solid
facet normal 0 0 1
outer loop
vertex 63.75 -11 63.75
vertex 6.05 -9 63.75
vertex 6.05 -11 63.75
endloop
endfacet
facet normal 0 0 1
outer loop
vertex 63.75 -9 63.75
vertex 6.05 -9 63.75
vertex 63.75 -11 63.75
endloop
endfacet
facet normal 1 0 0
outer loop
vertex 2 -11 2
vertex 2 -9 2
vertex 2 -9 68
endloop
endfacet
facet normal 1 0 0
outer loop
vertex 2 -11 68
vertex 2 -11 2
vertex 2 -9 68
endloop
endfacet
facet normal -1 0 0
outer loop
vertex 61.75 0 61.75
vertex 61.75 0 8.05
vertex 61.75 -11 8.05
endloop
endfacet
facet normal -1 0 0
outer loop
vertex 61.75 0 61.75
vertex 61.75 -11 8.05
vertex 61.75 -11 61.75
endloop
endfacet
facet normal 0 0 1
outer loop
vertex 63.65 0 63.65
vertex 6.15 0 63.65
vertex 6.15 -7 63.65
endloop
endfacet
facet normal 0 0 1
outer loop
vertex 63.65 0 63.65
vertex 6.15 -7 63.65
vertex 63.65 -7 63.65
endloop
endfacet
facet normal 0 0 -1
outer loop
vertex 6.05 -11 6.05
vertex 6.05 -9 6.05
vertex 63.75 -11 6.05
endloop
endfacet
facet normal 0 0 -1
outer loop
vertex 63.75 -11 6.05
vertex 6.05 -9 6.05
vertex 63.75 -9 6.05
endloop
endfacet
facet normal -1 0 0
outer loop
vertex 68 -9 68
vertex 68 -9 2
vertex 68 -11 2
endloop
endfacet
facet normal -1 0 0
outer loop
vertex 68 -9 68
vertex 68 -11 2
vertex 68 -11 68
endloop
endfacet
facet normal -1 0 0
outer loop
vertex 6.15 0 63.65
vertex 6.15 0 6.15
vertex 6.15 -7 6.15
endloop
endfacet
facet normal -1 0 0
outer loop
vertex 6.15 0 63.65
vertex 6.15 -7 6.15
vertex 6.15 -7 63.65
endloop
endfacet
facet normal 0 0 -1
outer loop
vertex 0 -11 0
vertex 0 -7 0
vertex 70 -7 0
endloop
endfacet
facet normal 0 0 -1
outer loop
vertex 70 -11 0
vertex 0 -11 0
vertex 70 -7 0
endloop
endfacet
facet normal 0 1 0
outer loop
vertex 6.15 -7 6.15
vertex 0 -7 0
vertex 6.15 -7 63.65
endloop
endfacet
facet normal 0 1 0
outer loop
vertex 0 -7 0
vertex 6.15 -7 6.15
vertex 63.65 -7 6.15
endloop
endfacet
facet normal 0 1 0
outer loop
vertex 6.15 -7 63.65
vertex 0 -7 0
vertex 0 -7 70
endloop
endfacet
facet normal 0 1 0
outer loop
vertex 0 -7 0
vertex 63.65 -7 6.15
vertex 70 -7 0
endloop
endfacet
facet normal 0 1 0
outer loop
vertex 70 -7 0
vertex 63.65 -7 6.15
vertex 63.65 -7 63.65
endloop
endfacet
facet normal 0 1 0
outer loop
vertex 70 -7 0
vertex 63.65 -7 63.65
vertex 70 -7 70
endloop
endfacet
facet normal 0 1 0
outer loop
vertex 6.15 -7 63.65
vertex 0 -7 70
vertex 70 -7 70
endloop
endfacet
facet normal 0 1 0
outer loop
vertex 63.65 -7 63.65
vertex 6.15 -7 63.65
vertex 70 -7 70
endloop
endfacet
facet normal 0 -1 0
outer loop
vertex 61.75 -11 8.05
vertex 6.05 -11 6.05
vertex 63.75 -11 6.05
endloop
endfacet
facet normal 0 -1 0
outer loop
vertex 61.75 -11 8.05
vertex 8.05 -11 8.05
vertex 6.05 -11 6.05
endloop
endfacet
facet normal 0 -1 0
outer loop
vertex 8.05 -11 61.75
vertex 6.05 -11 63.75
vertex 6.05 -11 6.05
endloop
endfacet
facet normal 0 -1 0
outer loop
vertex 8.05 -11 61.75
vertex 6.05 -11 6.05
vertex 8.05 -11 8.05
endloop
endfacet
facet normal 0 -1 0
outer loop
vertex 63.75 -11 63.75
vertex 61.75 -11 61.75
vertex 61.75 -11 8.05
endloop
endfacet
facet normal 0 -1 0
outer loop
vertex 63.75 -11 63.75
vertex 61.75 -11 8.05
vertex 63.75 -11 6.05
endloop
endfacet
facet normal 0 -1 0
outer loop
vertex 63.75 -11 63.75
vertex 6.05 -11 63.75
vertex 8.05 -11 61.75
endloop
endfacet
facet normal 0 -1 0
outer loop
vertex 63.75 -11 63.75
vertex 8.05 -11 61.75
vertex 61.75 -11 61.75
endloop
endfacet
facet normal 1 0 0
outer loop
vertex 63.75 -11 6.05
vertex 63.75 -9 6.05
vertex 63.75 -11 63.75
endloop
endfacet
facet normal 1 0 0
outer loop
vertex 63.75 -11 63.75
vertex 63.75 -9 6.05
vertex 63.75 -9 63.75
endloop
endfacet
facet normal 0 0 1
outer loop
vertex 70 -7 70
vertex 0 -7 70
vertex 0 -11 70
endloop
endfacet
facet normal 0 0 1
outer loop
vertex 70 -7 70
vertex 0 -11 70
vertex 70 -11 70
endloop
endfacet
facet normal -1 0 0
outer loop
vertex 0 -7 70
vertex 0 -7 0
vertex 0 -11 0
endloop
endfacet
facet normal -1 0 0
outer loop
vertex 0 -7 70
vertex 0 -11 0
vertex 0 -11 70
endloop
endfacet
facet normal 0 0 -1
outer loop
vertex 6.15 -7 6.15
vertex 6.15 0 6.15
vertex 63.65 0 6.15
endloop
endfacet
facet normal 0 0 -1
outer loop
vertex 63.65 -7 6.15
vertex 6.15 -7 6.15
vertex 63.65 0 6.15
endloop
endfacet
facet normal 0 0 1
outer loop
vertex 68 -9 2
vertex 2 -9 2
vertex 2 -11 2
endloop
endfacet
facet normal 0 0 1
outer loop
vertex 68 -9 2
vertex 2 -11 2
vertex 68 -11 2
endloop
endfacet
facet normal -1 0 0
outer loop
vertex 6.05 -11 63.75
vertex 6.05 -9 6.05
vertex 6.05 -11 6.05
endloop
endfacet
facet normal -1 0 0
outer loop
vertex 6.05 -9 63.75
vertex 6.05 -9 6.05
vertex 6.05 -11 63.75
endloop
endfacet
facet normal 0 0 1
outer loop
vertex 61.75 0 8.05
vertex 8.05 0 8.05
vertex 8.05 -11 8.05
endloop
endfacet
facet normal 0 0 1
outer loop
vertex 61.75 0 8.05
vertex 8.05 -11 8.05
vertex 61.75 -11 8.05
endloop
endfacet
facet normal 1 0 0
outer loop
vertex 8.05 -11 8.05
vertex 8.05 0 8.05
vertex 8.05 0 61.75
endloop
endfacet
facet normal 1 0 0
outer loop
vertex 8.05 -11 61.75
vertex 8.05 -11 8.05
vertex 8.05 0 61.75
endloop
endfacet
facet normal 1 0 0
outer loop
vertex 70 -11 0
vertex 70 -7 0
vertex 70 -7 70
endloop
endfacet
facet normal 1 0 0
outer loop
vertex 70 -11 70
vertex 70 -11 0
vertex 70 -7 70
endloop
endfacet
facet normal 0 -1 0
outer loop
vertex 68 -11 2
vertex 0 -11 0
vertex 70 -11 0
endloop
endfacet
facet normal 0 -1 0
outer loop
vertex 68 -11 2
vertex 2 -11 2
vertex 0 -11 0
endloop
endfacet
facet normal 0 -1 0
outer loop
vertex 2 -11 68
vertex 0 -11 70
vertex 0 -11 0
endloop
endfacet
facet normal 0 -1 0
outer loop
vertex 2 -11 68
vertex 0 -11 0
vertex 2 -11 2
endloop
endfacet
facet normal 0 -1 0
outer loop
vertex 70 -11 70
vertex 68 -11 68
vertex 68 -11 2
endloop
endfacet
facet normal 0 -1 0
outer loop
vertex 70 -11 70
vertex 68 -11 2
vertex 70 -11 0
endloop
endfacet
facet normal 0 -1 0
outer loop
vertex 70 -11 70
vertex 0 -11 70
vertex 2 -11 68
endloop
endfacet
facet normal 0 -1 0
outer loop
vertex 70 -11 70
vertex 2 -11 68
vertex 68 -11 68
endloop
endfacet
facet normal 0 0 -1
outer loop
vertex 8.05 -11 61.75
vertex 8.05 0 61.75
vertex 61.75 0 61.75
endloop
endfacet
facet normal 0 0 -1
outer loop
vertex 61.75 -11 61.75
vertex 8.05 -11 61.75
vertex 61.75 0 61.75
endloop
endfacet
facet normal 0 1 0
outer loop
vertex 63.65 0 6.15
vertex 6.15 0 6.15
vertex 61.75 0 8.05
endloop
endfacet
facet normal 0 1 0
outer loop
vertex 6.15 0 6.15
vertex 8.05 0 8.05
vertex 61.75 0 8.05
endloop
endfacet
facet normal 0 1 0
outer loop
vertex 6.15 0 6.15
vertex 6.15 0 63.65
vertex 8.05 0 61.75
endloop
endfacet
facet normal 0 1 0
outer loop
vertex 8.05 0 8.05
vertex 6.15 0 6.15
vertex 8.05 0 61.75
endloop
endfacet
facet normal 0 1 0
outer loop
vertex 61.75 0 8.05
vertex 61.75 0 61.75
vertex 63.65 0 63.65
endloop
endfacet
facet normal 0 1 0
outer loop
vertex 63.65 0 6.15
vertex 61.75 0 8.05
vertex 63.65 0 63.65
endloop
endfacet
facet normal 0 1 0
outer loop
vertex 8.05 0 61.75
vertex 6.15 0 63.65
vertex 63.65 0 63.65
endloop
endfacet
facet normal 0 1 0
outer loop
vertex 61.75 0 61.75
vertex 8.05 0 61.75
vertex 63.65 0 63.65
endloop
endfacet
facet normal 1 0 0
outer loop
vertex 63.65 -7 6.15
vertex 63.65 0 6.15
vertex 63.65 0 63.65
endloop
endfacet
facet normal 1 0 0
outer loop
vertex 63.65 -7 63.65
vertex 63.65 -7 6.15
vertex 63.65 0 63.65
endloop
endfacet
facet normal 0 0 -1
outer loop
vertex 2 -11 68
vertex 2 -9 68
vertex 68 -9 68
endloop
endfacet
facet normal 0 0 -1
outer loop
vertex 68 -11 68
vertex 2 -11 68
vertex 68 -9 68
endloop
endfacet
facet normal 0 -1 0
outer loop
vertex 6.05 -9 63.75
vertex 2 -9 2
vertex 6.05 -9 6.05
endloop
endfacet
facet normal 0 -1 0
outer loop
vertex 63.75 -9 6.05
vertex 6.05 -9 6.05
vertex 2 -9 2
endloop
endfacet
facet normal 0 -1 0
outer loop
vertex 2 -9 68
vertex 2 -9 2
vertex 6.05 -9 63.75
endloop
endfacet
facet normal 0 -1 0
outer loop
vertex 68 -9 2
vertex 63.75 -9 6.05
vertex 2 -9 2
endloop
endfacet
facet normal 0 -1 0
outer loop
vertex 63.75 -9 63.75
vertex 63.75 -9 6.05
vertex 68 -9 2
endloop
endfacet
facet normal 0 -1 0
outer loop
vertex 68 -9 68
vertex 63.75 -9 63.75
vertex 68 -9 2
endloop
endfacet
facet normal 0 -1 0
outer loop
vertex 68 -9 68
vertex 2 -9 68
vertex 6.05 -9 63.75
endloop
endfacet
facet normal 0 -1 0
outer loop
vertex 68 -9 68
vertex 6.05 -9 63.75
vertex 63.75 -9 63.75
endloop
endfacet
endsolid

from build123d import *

# Parameters (mm, degrees)
F0_W        = 70
F0_H        = 70
F0_W_2      = 64.5
F0_H_2      = 64.5
F0_W_3      = 57.5
F0_H_3      = 57.5
F0_W_4      = 53.7
F0_H_4      = 53.7
F1_DEPTH    = 11
F2_DEPTH    = 7
F3_T        = 2
F3_T3_DEPTH = 61.5
F3_T5_DEPTH = 61.5
F3_T7_DEPTH = 15


# Not quite as in the source:
# - a shell that OpenCascade refuses in one call is made with other operations: the cavity is built on its own and cut out


with BuildPart() as f1:
    # F0 (on Front) → F1 (new body)
    with BuildSketch(Plane.XZ):
        with Locations((35, 35)):
            Rectangle(F0_W, F0_H)
        with Locations((35, 35)):
            Rectangle(F0_W_2, F0_H_2, mode=Mode.SUBTRACT)
        with Locations((35, 35)):
            Rectangle(F0_W_2, F0_H_2)
        with Locations((34.9, 34.9)):
            Rectangle(F0_W_3, F0_H_3, mode=Mode.SUBTRACT)
        with Locations((34.9, 34.9)):
            Rectangle(F0_W_3, F0_H_3)
        with Locations((34.9, 34.9)):
            Rectangle(F0_W_4, F0_H_4, mode=Mode.SUBTRACT)
    extrude(amount=F1_DEPTH)

    # F0 (on Front) → F2 (cut)
    with BuildSketch(Plane.XZ):
        with Locations((35, 35)):
            Rectangle(F0_W, F0_H)
        with Locations((35, 35)):
            Rectangle(F0_W_2, F0_H_2, mode=Mode.SUBTRACT)
        with Locations((35, 35)):
            Rectangle(F0_W_2, F0_H_2)
        with Locations((34.9, 34.9)):
            Rectangle(F0_W_3, F0_H_3, mode=Mode.SUBTRACT)
    extrude(amount=F2_DEPTH, mode=Mode.SUBTRACT)

    # F3: shell of thickness 2, made by hand


with BuildPart() as f3_core1:
    # F3_t2: copy of F1
    add(f1.part)

    # the walls: a layer under each face that stays
    f3_faces = [f3_core1.faces().sort_by_distance(p)[0] for p in [
        (0, -9, 35),
        (5, -7, 5),
        (35, -9, 0),
        (35, -9, 70),
        (70, -9, 35),
        (63.65, -3.5, 34.9),
        (34.9, -3.5, 6.15),
        (6.15, -3.5, 34.9),
        (34.9, -3.5, 63.65),
        (34.9, -5.5, 8.05),
        (8.05, -5.5, 34.9),
        (34.9, -5.5, 61.75),
        (61.75, -5.5, 34.9),
        (7.946875, 0, 40.2240740741),
    ]]
    thicken(f3_faces, amount=-F3_T, mode=Mode.SUBTRACT)

    # F3_s4 → F3_t3 (cut)
    with BuildSketch(Plane.XY.offset(4.15)):
        Polygon((63.67, -6.98), (63.65, -9), (61.65, -9), (61.65, -7), align=None)
        Polygon((6.13, -6.98), (6.15, -9), (8.15, -9), (8.15, -7), align=None)
    extrude(amount=F3_T3_DEPTH, mode=Mode.SUBTRACT)

    # F3_s6 → F3_t5 (cut)
    with BuildSketch(Plane.YZ.offset(4.15)):
        Polygon((-6.98, 6.13), (-9, 6.15), (-9, 8.15), (-7, 8.15), align=None)
        Polygon((-6.98, 63.67), (-9, 63.65), (-9, 61.65), (-7, 61.65), align=None)
    extrude(amount=F3_T5_DEPTH, mode=Mode.SUBTRACT)

    # F3_s8 → F3_t7 (cut)
    with BuildSketch(Plane.XZ.offset(-2)):
        Polygon((61.73, 8.07), (61.75, 6.05), (63.75, 6.05), (63.75, 8.05), align=None)
        Polygon((8.07, 8.07), (8.05, 6.05), (6.05, 6.05), (6.05, 8.05), align=None)
        Polygon((8.07, 61.73), (6.05, 61.75), (6.05, 63.75), (8.05, 63.75), align=None)
        Polygon((61.73, 61.73), (61.75, 63.75), (63.75, 63.75), (63.75, 61.75), align=None)
    extrude(amount=F3_T7_DEPTH, mode=Mode.SUBTRACT)


with BuildPart() as f1_1:
    add(f1.part)

    # what is left inside the walls is the cavity
    f3_cavity = [f3_core1.part.solids().sort_by_distance(p)[0] for p in [
        (39.125, -9.02, 4.444444),
    ]]
    add(f3_cavity, mode=Mode.SUBTRACT)


solid = f1_1.part
